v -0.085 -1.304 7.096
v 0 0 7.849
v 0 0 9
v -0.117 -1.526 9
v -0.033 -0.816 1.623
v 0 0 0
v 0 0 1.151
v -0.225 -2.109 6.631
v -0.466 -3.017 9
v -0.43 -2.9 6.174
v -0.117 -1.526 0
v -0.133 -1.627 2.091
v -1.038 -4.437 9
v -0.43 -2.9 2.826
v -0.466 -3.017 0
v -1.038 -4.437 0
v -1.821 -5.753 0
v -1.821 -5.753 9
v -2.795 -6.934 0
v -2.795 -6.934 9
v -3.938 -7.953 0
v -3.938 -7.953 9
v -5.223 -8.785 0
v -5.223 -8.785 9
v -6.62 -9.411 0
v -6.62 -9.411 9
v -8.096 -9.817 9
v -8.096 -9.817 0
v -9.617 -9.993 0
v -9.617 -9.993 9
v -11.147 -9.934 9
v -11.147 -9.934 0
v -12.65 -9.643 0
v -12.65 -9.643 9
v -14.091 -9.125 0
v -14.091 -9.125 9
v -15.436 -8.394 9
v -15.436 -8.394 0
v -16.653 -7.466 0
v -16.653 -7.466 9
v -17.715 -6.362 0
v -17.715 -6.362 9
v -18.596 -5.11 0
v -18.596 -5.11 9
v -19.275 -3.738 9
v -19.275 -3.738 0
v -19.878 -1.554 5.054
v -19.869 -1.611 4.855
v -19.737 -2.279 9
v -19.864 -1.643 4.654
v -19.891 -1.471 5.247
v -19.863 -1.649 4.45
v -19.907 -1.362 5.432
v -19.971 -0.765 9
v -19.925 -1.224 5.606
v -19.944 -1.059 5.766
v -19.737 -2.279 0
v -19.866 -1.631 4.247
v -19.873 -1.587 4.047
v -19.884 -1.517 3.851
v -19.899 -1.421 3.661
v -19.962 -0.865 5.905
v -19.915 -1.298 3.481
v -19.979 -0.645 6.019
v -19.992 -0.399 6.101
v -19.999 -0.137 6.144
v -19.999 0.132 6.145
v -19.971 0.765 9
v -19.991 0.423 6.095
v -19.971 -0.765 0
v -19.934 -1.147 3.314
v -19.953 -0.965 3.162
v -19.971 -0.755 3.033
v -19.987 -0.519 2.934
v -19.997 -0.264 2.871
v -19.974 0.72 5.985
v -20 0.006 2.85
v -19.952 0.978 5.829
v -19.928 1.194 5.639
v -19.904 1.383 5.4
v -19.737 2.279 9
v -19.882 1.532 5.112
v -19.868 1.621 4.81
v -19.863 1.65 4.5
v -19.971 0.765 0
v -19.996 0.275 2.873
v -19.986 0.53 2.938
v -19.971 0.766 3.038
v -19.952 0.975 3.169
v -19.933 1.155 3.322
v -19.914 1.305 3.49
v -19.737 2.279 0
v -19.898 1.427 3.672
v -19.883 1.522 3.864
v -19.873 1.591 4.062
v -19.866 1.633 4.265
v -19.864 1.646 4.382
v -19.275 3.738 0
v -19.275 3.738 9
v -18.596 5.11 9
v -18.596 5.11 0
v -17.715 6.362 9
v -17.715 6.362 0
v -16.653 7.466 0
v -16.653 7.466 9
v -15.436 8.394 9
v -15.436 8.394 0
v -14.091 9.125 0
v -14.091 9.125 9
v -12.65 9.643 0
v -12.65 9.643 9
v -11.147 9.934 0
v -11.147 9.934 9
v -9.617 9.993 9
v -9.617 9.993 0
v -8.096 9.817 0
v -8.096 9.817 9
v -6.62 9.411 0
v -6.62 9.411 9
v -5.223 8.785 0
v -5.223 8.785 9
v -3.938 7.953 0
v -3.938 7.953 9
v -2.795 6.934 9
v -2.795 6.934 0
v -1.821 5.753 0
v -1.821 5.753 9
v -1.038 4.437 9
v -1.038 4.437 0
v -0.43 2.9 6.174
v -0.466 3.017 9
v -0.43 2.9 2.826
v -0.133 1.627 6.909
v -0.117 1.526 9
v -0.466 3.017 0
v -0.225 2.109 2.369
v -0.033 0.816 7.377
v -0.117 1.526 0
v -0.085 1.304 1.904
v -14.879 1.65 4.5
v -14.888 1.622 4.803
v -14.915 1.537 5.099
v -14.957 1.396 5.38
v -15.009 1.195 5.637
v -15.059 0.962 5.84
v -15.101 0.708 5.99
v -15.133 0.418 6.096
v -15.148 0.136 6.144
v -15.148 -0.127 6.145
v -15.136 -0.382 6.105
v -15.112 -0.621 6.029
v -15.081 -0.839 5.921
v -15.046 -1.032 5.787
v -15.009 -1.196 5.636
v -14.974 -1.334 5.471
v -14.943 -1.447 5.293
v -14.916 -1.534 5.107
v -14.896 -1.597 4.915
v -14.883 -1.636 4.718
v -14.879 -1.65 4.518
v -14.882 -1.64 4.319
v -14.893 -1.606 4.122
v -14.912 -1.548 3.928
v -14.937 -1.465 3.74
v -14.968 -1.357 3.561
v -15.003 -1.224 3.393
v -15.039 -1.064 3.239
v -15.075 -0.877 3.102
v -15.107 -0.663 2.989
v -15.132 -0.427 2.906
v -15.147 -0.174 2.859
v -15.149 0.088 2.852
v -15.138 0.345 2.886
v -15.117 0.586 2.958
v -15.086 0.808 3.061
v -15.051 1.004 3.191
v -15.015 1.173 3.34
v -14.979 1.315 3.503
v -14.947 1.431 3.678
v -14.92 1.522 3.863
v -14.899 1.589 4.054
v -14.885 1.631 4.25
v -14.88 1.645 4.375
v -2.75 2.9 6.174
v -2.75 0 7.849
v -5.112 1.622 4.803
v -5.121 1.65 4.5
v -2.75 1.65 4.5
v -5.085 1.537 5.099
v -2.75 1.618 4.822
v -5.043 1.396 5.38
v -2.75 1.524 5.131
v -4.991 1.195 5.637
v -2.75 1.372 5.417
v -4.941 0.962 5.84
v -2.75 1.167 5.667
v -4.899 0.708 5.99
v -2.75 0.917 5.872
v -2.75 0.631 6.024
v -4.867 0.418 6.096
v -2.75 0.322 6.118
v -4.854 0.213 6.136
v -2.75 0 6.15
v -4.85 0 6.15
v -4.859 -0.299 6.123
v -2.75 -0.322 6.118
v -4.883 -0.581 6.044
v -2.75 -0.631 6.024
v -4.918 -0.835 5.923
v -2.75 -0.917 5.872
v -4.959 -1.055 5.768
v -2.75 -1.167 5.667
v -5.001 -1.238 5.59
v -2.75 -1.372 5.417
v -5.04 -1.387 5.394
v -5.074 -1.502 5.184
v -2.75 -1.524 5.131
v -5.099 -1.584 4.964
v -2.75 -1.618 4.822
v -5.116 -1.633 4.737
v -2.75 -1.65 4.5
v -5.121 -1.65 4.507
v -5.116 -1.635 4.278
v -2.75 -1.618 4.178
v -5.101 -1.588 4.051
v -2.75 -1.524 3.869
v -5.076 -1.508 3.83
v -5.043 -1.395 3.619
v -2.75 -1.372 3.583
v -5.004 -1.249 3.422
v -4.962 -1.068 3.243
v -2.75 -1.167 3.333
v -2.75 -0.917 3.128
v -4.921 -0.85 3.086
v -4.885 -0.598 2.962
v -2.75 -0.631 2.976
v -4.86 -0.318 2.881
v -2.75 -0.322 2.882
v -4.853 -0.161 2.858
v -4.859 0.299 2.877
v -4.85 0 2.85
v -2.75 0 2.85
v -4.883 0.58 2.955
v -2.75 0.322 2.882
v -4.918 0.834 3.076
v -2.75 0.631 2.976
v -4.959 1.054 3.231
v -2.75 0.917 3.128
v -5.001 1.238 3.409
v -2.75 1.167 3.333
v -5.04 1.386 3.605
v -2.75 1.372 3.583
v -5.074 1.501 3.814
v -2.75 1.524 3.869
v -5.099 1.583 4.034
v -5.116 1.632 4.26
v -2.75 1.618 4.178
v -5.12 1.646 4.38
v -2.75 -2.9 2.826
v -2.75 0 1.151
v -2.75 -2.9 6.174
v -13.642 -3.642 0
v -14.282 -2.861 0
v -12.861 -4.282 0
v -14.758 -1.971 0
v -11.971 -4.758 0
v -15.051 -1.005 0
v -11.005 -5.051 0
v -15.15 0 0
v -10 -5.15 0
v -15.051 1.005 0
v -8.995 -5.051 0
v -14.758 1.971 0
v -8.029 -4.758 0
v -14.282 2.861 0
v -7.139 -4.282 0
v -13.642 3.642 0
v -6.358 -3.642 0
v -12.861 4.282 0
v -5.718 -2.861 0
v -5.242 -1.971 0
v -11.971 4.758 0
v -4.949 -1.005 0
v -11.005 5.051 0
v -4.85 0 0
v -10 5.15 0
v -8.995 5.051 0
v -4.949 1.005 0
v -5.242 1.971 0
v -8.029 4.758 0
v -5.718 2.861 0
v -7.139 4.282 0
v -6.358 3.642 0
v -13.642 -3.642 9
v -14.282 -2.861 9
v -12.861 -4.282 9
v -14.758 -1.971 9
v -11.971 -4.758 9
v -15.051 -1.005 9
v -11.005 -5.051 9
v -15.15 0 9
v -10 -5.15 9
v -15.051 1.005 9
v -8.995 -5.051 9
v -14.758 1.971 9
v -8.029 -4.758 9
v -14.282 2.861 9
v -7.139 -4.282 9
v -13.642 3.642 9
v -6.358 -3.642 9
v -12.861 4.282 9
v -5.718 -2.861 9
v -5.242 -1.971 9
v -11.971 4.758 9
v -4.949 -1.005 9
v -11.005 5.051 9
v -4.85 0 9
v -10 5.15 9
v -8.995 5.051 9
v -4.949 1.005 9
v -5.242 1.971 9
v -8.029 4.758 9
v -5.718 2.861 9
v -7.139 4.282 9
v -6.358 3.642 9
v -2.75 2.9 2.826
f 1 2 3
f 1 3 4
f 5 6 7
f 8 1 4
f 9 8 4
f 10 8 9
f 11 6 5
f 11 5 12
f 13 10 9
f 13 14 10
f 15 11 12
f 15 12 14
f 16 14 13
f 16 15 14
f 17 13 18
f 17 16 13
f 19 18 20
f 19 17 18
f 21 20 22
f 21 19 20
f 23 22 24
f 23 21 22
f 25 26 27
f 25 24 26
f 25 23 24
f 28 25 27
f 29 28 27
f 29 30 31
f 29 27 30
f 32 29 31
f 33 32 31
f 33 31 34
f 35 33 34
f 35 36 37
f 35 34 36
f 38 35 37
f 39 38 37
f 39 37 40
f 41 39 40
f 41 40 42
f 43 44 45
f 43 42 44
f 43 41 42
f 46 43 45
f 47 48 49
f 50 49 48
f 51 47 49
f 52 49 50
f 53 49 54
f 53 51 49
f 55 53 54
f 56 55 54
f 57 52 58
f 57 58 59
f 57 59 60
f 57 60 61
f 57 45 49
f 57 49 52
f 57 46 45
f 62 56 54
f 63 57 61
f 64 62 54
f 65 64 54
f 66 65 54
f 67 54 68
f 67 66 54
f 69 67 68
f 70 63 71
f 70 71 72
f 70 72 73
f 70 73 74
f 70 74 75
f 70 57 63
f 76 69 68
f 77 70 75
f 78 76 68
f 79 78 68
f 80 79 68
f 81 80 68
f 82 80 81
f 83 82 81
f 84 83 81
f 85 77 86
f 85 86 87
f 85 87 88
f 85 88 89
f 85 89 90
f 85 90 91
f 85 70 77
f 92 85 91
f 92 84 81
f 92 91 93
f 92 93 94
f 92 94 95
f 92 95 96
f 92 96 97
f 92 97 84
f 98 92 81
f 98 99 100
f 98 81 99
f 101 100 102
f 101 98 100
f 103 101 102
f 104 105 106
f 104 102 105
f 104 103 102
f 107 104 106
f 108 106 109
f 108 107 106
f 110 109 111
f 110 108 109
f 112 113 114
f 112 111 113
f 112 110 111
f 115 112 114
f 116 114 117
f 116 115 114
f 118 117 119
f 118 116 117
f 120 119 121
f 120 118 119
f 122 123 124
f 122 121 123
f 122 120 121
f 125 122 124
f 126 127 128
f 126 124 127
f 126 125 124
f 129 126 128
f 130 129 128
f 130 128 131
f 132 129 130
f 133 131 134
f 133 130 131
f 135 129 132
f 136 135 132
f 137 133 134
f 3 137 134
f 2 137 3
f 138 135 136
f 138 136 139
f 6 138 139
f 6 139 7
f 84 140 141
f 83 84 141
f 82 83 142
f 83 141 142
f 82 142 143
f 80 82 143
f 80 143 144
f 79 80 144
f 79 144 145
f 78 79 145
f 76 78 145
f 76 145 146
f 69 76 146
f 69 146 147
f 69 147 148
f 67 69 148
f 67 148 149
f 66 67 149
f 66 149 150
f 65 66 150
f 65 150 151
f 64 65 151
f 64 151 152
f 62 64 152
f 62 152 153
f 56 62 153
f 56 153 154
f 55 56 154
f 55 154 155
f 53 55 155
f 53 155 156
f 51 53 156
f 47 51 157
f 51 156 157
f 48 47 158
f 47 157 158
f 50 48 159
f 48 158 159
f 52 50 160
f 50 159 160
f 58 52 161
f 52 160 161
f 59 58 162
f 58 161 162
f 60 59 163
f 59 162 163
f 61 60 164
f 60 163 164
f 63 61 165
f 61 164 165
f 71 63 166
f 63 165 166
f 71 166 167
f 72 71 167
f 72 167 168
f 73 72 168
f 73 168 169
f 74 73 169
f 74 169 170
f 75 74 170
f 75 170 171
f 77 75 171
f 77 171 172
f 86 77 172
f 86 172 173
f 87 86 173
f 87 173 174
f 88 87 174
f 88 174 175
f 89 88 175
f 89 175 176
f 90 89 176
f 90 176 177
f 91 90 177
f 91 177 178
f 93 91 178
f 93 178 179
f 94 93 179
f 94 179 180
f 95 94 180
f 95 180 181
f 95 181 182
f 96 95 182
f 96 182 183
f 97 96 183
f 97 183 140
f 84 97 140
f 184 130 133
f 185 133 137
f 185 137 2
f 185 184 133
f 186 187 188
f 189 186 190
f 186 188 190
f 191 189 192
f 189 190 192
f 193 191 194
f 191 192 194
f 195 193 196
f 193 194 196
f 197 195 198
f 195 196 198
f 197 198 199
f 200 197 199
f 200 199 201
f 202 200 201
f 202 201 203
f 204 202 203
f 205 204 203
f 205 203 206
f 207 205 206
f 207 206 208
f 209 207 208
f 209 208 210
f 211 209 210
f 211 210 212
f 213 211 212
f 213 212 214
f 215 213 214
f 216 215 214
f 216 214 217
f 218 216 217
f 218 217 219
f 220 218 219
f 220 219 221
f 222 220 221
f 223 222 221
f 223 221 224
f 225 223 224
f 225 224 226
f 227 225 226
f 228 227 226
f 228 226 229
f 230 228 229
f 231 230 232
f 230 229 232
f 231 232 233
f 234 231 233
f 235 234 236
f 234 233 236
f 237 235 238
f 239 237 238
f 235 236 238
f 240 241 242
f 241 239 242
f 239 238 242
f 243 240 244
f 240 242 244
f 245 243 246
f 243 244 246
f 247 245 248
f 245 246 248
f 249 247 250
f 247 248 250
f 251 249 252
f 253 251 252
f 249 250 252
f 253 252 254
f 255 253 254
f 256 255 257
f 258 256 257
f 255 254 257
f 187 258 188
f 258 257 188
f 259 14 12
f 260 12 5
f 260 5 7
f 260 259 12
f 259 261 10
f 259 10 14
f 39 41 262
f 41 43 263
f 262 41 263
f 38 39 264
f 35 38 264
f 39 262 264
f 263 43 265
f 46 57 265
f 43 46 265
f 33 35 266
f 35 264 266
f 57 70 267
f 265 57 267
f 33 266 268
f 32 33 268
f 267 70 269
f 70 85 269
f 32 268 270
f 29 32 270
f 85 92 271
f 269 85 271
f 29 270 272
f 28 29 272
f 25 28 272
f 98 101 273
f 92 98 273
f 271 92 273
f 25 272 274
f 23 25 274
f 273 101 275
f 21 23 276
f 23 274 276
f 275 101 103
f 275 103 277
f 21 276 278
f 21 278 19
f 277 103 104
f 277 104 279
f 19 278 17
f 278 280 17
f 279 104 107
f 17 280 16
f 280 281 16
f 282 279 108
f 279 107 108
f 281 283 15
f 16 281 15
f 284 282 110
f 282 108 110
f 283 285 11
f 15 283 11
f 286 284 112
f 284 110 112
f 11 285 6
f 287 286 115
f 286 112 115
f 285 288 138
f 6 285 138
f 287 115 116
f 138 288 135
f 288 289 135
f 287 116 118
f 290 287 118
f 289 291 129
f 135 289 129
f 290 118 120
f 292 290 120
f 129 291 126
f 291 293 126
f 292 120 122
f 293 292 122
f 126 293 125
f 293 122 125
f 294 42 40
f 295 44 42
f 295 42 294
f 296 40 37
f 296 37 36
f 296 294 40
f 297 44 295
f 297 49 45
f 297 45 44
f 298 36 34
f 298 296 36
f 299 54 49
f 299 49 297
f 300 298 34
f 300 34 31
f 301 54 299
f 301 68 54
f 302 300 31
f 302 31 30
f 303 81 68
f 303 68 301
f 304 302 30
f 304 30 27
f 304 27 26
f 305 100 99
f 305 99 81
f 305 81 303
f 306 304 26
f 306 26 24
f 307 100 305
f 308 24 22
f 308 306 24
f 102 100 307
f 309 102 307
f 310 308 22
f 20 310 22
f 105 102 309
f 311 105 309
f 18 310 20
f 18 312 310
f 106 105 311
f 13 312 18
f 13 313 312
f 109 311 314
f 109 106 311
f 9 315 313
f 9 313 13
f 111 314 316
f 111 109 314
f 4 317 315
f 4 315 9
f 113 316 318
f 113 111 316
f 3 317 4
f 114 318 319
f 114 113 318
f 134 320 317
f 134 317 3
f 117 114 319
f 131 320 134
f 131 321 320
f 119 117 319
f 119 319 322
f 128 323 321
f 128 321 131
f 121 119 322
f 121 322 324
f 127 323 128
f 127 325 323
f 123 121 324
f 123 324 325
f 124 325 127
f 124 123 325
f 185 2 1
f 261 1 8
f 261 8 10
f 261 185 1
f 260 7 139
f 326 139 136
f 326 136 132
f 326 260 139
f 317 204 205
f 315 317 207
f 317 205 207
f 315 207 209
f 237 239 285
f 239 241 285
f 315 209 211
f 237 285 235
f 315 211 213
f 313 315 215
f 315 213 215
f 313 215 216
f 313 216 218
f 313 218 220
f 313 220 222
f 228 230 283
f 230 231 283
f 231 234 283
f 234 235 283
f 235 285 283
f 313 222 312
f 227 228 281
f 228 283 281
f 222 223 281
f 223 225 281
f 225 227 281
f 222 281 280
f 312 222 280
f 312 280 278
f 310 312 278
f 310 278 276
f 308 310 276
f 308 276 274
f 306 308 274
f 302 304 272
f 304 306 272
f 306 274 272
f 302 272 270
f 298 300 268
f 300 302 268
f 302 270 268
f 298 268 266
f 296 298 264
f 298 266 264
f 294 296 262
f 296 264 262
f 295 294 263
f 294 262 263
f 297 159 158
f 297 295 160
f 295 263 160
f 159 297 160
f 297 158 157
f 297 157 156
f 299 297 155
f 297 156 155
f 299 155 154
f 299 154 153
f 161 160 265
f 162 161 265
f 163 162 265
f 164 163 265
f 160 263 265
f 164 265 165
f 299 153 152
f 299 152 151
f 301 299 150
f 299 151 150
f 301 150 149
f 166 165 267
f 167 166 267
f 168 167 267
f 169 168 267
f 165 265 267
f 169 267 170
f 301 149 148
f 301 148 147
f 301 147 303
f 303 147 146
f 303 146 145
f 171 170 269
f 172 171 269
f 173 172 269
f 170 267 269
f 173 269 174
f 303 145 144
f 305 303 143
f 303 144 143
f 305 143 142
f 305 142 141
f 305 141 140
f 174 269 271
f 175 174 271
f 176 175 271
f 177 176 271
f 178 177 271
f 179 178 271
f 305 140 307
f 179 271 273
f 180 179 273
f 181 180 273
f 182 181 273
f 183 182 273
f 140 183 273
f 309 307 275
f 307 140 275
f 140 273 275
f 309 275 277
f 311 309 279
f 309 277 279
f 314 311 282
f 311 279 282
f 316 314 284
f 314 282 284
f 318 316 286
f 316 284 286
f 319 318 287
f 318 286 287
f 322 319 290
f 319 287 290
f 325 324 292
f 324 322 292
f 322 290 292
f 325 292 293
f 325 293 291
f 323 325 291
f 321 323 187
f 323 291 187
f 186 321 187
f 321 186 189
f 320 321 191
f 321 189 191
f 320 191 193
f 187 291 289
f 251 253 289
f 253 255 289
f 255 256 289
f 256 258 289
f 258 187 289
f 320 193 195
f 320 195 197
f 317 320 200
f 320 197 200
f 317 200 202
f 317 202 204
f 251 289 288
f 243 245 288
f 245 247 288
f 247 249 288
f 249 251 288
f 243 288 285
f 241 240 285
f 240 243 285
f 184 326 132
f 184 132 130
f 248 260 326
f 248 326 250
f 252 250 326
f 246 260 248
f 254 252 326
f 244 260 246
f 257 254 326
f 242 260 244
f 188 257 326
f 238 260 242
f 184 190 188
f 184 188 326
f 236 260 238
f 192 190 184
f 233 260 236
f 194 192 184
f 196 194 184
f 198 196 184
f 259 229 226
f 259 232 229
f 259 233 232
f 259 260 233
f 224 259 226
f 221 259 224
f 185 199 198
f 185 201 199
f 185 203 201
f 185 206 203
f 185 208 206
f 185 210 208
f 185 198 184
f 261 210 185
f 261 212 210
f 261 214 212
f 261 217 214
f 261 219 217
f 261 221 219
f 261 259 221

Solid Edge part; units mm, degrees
sketch "Sketch1" plane through (0, 0, 0) normal (0, 0, 1) x (1, 0, 0)
  circle A0 centre (-10, 0) radius 5.15
  circle A1 centre (-10, 0) radius 10
  dimension "D1" = 10.3
  dimension "D2" = 20
extrude "Protrusion1" add sketch "Sketch1" along normal blind 9
sketch "Sketch2" plane through (0, 0, 0) normal (1, 0, 0) x (0, 1, 0)
  circle A0 centre (0, 4.5) radius 1.65
extrude "ExtrudedCutout_1" cut sketch "Sketch2" along normal mid plane 46.3227
sketch "Sketch3" plane through (0, 0, 0) normal (1, 0, 0) x (0, 1, 0)
  line L0 (2.9, 2.8257) -> (2.9, 6.1743)
  line L1 (2.9, 6.1743) -> (0, 7.8486)
  line L2 (0, 7.8486) -> (-2.9, 6.1743)
  line L3 (-2.9, 6.1743) -> (-2.9, 2.8257)
  line L4 (-2.9, 2.8257) -> (0, 1.1514)
  line L5 (0, 1.1514) -> (2.9, 2.8257)
  dimension "D1" = 5.8
extrude "ExtrudedCutout_2" cut sketch "Sketch3" along normal mid plane 5.5
